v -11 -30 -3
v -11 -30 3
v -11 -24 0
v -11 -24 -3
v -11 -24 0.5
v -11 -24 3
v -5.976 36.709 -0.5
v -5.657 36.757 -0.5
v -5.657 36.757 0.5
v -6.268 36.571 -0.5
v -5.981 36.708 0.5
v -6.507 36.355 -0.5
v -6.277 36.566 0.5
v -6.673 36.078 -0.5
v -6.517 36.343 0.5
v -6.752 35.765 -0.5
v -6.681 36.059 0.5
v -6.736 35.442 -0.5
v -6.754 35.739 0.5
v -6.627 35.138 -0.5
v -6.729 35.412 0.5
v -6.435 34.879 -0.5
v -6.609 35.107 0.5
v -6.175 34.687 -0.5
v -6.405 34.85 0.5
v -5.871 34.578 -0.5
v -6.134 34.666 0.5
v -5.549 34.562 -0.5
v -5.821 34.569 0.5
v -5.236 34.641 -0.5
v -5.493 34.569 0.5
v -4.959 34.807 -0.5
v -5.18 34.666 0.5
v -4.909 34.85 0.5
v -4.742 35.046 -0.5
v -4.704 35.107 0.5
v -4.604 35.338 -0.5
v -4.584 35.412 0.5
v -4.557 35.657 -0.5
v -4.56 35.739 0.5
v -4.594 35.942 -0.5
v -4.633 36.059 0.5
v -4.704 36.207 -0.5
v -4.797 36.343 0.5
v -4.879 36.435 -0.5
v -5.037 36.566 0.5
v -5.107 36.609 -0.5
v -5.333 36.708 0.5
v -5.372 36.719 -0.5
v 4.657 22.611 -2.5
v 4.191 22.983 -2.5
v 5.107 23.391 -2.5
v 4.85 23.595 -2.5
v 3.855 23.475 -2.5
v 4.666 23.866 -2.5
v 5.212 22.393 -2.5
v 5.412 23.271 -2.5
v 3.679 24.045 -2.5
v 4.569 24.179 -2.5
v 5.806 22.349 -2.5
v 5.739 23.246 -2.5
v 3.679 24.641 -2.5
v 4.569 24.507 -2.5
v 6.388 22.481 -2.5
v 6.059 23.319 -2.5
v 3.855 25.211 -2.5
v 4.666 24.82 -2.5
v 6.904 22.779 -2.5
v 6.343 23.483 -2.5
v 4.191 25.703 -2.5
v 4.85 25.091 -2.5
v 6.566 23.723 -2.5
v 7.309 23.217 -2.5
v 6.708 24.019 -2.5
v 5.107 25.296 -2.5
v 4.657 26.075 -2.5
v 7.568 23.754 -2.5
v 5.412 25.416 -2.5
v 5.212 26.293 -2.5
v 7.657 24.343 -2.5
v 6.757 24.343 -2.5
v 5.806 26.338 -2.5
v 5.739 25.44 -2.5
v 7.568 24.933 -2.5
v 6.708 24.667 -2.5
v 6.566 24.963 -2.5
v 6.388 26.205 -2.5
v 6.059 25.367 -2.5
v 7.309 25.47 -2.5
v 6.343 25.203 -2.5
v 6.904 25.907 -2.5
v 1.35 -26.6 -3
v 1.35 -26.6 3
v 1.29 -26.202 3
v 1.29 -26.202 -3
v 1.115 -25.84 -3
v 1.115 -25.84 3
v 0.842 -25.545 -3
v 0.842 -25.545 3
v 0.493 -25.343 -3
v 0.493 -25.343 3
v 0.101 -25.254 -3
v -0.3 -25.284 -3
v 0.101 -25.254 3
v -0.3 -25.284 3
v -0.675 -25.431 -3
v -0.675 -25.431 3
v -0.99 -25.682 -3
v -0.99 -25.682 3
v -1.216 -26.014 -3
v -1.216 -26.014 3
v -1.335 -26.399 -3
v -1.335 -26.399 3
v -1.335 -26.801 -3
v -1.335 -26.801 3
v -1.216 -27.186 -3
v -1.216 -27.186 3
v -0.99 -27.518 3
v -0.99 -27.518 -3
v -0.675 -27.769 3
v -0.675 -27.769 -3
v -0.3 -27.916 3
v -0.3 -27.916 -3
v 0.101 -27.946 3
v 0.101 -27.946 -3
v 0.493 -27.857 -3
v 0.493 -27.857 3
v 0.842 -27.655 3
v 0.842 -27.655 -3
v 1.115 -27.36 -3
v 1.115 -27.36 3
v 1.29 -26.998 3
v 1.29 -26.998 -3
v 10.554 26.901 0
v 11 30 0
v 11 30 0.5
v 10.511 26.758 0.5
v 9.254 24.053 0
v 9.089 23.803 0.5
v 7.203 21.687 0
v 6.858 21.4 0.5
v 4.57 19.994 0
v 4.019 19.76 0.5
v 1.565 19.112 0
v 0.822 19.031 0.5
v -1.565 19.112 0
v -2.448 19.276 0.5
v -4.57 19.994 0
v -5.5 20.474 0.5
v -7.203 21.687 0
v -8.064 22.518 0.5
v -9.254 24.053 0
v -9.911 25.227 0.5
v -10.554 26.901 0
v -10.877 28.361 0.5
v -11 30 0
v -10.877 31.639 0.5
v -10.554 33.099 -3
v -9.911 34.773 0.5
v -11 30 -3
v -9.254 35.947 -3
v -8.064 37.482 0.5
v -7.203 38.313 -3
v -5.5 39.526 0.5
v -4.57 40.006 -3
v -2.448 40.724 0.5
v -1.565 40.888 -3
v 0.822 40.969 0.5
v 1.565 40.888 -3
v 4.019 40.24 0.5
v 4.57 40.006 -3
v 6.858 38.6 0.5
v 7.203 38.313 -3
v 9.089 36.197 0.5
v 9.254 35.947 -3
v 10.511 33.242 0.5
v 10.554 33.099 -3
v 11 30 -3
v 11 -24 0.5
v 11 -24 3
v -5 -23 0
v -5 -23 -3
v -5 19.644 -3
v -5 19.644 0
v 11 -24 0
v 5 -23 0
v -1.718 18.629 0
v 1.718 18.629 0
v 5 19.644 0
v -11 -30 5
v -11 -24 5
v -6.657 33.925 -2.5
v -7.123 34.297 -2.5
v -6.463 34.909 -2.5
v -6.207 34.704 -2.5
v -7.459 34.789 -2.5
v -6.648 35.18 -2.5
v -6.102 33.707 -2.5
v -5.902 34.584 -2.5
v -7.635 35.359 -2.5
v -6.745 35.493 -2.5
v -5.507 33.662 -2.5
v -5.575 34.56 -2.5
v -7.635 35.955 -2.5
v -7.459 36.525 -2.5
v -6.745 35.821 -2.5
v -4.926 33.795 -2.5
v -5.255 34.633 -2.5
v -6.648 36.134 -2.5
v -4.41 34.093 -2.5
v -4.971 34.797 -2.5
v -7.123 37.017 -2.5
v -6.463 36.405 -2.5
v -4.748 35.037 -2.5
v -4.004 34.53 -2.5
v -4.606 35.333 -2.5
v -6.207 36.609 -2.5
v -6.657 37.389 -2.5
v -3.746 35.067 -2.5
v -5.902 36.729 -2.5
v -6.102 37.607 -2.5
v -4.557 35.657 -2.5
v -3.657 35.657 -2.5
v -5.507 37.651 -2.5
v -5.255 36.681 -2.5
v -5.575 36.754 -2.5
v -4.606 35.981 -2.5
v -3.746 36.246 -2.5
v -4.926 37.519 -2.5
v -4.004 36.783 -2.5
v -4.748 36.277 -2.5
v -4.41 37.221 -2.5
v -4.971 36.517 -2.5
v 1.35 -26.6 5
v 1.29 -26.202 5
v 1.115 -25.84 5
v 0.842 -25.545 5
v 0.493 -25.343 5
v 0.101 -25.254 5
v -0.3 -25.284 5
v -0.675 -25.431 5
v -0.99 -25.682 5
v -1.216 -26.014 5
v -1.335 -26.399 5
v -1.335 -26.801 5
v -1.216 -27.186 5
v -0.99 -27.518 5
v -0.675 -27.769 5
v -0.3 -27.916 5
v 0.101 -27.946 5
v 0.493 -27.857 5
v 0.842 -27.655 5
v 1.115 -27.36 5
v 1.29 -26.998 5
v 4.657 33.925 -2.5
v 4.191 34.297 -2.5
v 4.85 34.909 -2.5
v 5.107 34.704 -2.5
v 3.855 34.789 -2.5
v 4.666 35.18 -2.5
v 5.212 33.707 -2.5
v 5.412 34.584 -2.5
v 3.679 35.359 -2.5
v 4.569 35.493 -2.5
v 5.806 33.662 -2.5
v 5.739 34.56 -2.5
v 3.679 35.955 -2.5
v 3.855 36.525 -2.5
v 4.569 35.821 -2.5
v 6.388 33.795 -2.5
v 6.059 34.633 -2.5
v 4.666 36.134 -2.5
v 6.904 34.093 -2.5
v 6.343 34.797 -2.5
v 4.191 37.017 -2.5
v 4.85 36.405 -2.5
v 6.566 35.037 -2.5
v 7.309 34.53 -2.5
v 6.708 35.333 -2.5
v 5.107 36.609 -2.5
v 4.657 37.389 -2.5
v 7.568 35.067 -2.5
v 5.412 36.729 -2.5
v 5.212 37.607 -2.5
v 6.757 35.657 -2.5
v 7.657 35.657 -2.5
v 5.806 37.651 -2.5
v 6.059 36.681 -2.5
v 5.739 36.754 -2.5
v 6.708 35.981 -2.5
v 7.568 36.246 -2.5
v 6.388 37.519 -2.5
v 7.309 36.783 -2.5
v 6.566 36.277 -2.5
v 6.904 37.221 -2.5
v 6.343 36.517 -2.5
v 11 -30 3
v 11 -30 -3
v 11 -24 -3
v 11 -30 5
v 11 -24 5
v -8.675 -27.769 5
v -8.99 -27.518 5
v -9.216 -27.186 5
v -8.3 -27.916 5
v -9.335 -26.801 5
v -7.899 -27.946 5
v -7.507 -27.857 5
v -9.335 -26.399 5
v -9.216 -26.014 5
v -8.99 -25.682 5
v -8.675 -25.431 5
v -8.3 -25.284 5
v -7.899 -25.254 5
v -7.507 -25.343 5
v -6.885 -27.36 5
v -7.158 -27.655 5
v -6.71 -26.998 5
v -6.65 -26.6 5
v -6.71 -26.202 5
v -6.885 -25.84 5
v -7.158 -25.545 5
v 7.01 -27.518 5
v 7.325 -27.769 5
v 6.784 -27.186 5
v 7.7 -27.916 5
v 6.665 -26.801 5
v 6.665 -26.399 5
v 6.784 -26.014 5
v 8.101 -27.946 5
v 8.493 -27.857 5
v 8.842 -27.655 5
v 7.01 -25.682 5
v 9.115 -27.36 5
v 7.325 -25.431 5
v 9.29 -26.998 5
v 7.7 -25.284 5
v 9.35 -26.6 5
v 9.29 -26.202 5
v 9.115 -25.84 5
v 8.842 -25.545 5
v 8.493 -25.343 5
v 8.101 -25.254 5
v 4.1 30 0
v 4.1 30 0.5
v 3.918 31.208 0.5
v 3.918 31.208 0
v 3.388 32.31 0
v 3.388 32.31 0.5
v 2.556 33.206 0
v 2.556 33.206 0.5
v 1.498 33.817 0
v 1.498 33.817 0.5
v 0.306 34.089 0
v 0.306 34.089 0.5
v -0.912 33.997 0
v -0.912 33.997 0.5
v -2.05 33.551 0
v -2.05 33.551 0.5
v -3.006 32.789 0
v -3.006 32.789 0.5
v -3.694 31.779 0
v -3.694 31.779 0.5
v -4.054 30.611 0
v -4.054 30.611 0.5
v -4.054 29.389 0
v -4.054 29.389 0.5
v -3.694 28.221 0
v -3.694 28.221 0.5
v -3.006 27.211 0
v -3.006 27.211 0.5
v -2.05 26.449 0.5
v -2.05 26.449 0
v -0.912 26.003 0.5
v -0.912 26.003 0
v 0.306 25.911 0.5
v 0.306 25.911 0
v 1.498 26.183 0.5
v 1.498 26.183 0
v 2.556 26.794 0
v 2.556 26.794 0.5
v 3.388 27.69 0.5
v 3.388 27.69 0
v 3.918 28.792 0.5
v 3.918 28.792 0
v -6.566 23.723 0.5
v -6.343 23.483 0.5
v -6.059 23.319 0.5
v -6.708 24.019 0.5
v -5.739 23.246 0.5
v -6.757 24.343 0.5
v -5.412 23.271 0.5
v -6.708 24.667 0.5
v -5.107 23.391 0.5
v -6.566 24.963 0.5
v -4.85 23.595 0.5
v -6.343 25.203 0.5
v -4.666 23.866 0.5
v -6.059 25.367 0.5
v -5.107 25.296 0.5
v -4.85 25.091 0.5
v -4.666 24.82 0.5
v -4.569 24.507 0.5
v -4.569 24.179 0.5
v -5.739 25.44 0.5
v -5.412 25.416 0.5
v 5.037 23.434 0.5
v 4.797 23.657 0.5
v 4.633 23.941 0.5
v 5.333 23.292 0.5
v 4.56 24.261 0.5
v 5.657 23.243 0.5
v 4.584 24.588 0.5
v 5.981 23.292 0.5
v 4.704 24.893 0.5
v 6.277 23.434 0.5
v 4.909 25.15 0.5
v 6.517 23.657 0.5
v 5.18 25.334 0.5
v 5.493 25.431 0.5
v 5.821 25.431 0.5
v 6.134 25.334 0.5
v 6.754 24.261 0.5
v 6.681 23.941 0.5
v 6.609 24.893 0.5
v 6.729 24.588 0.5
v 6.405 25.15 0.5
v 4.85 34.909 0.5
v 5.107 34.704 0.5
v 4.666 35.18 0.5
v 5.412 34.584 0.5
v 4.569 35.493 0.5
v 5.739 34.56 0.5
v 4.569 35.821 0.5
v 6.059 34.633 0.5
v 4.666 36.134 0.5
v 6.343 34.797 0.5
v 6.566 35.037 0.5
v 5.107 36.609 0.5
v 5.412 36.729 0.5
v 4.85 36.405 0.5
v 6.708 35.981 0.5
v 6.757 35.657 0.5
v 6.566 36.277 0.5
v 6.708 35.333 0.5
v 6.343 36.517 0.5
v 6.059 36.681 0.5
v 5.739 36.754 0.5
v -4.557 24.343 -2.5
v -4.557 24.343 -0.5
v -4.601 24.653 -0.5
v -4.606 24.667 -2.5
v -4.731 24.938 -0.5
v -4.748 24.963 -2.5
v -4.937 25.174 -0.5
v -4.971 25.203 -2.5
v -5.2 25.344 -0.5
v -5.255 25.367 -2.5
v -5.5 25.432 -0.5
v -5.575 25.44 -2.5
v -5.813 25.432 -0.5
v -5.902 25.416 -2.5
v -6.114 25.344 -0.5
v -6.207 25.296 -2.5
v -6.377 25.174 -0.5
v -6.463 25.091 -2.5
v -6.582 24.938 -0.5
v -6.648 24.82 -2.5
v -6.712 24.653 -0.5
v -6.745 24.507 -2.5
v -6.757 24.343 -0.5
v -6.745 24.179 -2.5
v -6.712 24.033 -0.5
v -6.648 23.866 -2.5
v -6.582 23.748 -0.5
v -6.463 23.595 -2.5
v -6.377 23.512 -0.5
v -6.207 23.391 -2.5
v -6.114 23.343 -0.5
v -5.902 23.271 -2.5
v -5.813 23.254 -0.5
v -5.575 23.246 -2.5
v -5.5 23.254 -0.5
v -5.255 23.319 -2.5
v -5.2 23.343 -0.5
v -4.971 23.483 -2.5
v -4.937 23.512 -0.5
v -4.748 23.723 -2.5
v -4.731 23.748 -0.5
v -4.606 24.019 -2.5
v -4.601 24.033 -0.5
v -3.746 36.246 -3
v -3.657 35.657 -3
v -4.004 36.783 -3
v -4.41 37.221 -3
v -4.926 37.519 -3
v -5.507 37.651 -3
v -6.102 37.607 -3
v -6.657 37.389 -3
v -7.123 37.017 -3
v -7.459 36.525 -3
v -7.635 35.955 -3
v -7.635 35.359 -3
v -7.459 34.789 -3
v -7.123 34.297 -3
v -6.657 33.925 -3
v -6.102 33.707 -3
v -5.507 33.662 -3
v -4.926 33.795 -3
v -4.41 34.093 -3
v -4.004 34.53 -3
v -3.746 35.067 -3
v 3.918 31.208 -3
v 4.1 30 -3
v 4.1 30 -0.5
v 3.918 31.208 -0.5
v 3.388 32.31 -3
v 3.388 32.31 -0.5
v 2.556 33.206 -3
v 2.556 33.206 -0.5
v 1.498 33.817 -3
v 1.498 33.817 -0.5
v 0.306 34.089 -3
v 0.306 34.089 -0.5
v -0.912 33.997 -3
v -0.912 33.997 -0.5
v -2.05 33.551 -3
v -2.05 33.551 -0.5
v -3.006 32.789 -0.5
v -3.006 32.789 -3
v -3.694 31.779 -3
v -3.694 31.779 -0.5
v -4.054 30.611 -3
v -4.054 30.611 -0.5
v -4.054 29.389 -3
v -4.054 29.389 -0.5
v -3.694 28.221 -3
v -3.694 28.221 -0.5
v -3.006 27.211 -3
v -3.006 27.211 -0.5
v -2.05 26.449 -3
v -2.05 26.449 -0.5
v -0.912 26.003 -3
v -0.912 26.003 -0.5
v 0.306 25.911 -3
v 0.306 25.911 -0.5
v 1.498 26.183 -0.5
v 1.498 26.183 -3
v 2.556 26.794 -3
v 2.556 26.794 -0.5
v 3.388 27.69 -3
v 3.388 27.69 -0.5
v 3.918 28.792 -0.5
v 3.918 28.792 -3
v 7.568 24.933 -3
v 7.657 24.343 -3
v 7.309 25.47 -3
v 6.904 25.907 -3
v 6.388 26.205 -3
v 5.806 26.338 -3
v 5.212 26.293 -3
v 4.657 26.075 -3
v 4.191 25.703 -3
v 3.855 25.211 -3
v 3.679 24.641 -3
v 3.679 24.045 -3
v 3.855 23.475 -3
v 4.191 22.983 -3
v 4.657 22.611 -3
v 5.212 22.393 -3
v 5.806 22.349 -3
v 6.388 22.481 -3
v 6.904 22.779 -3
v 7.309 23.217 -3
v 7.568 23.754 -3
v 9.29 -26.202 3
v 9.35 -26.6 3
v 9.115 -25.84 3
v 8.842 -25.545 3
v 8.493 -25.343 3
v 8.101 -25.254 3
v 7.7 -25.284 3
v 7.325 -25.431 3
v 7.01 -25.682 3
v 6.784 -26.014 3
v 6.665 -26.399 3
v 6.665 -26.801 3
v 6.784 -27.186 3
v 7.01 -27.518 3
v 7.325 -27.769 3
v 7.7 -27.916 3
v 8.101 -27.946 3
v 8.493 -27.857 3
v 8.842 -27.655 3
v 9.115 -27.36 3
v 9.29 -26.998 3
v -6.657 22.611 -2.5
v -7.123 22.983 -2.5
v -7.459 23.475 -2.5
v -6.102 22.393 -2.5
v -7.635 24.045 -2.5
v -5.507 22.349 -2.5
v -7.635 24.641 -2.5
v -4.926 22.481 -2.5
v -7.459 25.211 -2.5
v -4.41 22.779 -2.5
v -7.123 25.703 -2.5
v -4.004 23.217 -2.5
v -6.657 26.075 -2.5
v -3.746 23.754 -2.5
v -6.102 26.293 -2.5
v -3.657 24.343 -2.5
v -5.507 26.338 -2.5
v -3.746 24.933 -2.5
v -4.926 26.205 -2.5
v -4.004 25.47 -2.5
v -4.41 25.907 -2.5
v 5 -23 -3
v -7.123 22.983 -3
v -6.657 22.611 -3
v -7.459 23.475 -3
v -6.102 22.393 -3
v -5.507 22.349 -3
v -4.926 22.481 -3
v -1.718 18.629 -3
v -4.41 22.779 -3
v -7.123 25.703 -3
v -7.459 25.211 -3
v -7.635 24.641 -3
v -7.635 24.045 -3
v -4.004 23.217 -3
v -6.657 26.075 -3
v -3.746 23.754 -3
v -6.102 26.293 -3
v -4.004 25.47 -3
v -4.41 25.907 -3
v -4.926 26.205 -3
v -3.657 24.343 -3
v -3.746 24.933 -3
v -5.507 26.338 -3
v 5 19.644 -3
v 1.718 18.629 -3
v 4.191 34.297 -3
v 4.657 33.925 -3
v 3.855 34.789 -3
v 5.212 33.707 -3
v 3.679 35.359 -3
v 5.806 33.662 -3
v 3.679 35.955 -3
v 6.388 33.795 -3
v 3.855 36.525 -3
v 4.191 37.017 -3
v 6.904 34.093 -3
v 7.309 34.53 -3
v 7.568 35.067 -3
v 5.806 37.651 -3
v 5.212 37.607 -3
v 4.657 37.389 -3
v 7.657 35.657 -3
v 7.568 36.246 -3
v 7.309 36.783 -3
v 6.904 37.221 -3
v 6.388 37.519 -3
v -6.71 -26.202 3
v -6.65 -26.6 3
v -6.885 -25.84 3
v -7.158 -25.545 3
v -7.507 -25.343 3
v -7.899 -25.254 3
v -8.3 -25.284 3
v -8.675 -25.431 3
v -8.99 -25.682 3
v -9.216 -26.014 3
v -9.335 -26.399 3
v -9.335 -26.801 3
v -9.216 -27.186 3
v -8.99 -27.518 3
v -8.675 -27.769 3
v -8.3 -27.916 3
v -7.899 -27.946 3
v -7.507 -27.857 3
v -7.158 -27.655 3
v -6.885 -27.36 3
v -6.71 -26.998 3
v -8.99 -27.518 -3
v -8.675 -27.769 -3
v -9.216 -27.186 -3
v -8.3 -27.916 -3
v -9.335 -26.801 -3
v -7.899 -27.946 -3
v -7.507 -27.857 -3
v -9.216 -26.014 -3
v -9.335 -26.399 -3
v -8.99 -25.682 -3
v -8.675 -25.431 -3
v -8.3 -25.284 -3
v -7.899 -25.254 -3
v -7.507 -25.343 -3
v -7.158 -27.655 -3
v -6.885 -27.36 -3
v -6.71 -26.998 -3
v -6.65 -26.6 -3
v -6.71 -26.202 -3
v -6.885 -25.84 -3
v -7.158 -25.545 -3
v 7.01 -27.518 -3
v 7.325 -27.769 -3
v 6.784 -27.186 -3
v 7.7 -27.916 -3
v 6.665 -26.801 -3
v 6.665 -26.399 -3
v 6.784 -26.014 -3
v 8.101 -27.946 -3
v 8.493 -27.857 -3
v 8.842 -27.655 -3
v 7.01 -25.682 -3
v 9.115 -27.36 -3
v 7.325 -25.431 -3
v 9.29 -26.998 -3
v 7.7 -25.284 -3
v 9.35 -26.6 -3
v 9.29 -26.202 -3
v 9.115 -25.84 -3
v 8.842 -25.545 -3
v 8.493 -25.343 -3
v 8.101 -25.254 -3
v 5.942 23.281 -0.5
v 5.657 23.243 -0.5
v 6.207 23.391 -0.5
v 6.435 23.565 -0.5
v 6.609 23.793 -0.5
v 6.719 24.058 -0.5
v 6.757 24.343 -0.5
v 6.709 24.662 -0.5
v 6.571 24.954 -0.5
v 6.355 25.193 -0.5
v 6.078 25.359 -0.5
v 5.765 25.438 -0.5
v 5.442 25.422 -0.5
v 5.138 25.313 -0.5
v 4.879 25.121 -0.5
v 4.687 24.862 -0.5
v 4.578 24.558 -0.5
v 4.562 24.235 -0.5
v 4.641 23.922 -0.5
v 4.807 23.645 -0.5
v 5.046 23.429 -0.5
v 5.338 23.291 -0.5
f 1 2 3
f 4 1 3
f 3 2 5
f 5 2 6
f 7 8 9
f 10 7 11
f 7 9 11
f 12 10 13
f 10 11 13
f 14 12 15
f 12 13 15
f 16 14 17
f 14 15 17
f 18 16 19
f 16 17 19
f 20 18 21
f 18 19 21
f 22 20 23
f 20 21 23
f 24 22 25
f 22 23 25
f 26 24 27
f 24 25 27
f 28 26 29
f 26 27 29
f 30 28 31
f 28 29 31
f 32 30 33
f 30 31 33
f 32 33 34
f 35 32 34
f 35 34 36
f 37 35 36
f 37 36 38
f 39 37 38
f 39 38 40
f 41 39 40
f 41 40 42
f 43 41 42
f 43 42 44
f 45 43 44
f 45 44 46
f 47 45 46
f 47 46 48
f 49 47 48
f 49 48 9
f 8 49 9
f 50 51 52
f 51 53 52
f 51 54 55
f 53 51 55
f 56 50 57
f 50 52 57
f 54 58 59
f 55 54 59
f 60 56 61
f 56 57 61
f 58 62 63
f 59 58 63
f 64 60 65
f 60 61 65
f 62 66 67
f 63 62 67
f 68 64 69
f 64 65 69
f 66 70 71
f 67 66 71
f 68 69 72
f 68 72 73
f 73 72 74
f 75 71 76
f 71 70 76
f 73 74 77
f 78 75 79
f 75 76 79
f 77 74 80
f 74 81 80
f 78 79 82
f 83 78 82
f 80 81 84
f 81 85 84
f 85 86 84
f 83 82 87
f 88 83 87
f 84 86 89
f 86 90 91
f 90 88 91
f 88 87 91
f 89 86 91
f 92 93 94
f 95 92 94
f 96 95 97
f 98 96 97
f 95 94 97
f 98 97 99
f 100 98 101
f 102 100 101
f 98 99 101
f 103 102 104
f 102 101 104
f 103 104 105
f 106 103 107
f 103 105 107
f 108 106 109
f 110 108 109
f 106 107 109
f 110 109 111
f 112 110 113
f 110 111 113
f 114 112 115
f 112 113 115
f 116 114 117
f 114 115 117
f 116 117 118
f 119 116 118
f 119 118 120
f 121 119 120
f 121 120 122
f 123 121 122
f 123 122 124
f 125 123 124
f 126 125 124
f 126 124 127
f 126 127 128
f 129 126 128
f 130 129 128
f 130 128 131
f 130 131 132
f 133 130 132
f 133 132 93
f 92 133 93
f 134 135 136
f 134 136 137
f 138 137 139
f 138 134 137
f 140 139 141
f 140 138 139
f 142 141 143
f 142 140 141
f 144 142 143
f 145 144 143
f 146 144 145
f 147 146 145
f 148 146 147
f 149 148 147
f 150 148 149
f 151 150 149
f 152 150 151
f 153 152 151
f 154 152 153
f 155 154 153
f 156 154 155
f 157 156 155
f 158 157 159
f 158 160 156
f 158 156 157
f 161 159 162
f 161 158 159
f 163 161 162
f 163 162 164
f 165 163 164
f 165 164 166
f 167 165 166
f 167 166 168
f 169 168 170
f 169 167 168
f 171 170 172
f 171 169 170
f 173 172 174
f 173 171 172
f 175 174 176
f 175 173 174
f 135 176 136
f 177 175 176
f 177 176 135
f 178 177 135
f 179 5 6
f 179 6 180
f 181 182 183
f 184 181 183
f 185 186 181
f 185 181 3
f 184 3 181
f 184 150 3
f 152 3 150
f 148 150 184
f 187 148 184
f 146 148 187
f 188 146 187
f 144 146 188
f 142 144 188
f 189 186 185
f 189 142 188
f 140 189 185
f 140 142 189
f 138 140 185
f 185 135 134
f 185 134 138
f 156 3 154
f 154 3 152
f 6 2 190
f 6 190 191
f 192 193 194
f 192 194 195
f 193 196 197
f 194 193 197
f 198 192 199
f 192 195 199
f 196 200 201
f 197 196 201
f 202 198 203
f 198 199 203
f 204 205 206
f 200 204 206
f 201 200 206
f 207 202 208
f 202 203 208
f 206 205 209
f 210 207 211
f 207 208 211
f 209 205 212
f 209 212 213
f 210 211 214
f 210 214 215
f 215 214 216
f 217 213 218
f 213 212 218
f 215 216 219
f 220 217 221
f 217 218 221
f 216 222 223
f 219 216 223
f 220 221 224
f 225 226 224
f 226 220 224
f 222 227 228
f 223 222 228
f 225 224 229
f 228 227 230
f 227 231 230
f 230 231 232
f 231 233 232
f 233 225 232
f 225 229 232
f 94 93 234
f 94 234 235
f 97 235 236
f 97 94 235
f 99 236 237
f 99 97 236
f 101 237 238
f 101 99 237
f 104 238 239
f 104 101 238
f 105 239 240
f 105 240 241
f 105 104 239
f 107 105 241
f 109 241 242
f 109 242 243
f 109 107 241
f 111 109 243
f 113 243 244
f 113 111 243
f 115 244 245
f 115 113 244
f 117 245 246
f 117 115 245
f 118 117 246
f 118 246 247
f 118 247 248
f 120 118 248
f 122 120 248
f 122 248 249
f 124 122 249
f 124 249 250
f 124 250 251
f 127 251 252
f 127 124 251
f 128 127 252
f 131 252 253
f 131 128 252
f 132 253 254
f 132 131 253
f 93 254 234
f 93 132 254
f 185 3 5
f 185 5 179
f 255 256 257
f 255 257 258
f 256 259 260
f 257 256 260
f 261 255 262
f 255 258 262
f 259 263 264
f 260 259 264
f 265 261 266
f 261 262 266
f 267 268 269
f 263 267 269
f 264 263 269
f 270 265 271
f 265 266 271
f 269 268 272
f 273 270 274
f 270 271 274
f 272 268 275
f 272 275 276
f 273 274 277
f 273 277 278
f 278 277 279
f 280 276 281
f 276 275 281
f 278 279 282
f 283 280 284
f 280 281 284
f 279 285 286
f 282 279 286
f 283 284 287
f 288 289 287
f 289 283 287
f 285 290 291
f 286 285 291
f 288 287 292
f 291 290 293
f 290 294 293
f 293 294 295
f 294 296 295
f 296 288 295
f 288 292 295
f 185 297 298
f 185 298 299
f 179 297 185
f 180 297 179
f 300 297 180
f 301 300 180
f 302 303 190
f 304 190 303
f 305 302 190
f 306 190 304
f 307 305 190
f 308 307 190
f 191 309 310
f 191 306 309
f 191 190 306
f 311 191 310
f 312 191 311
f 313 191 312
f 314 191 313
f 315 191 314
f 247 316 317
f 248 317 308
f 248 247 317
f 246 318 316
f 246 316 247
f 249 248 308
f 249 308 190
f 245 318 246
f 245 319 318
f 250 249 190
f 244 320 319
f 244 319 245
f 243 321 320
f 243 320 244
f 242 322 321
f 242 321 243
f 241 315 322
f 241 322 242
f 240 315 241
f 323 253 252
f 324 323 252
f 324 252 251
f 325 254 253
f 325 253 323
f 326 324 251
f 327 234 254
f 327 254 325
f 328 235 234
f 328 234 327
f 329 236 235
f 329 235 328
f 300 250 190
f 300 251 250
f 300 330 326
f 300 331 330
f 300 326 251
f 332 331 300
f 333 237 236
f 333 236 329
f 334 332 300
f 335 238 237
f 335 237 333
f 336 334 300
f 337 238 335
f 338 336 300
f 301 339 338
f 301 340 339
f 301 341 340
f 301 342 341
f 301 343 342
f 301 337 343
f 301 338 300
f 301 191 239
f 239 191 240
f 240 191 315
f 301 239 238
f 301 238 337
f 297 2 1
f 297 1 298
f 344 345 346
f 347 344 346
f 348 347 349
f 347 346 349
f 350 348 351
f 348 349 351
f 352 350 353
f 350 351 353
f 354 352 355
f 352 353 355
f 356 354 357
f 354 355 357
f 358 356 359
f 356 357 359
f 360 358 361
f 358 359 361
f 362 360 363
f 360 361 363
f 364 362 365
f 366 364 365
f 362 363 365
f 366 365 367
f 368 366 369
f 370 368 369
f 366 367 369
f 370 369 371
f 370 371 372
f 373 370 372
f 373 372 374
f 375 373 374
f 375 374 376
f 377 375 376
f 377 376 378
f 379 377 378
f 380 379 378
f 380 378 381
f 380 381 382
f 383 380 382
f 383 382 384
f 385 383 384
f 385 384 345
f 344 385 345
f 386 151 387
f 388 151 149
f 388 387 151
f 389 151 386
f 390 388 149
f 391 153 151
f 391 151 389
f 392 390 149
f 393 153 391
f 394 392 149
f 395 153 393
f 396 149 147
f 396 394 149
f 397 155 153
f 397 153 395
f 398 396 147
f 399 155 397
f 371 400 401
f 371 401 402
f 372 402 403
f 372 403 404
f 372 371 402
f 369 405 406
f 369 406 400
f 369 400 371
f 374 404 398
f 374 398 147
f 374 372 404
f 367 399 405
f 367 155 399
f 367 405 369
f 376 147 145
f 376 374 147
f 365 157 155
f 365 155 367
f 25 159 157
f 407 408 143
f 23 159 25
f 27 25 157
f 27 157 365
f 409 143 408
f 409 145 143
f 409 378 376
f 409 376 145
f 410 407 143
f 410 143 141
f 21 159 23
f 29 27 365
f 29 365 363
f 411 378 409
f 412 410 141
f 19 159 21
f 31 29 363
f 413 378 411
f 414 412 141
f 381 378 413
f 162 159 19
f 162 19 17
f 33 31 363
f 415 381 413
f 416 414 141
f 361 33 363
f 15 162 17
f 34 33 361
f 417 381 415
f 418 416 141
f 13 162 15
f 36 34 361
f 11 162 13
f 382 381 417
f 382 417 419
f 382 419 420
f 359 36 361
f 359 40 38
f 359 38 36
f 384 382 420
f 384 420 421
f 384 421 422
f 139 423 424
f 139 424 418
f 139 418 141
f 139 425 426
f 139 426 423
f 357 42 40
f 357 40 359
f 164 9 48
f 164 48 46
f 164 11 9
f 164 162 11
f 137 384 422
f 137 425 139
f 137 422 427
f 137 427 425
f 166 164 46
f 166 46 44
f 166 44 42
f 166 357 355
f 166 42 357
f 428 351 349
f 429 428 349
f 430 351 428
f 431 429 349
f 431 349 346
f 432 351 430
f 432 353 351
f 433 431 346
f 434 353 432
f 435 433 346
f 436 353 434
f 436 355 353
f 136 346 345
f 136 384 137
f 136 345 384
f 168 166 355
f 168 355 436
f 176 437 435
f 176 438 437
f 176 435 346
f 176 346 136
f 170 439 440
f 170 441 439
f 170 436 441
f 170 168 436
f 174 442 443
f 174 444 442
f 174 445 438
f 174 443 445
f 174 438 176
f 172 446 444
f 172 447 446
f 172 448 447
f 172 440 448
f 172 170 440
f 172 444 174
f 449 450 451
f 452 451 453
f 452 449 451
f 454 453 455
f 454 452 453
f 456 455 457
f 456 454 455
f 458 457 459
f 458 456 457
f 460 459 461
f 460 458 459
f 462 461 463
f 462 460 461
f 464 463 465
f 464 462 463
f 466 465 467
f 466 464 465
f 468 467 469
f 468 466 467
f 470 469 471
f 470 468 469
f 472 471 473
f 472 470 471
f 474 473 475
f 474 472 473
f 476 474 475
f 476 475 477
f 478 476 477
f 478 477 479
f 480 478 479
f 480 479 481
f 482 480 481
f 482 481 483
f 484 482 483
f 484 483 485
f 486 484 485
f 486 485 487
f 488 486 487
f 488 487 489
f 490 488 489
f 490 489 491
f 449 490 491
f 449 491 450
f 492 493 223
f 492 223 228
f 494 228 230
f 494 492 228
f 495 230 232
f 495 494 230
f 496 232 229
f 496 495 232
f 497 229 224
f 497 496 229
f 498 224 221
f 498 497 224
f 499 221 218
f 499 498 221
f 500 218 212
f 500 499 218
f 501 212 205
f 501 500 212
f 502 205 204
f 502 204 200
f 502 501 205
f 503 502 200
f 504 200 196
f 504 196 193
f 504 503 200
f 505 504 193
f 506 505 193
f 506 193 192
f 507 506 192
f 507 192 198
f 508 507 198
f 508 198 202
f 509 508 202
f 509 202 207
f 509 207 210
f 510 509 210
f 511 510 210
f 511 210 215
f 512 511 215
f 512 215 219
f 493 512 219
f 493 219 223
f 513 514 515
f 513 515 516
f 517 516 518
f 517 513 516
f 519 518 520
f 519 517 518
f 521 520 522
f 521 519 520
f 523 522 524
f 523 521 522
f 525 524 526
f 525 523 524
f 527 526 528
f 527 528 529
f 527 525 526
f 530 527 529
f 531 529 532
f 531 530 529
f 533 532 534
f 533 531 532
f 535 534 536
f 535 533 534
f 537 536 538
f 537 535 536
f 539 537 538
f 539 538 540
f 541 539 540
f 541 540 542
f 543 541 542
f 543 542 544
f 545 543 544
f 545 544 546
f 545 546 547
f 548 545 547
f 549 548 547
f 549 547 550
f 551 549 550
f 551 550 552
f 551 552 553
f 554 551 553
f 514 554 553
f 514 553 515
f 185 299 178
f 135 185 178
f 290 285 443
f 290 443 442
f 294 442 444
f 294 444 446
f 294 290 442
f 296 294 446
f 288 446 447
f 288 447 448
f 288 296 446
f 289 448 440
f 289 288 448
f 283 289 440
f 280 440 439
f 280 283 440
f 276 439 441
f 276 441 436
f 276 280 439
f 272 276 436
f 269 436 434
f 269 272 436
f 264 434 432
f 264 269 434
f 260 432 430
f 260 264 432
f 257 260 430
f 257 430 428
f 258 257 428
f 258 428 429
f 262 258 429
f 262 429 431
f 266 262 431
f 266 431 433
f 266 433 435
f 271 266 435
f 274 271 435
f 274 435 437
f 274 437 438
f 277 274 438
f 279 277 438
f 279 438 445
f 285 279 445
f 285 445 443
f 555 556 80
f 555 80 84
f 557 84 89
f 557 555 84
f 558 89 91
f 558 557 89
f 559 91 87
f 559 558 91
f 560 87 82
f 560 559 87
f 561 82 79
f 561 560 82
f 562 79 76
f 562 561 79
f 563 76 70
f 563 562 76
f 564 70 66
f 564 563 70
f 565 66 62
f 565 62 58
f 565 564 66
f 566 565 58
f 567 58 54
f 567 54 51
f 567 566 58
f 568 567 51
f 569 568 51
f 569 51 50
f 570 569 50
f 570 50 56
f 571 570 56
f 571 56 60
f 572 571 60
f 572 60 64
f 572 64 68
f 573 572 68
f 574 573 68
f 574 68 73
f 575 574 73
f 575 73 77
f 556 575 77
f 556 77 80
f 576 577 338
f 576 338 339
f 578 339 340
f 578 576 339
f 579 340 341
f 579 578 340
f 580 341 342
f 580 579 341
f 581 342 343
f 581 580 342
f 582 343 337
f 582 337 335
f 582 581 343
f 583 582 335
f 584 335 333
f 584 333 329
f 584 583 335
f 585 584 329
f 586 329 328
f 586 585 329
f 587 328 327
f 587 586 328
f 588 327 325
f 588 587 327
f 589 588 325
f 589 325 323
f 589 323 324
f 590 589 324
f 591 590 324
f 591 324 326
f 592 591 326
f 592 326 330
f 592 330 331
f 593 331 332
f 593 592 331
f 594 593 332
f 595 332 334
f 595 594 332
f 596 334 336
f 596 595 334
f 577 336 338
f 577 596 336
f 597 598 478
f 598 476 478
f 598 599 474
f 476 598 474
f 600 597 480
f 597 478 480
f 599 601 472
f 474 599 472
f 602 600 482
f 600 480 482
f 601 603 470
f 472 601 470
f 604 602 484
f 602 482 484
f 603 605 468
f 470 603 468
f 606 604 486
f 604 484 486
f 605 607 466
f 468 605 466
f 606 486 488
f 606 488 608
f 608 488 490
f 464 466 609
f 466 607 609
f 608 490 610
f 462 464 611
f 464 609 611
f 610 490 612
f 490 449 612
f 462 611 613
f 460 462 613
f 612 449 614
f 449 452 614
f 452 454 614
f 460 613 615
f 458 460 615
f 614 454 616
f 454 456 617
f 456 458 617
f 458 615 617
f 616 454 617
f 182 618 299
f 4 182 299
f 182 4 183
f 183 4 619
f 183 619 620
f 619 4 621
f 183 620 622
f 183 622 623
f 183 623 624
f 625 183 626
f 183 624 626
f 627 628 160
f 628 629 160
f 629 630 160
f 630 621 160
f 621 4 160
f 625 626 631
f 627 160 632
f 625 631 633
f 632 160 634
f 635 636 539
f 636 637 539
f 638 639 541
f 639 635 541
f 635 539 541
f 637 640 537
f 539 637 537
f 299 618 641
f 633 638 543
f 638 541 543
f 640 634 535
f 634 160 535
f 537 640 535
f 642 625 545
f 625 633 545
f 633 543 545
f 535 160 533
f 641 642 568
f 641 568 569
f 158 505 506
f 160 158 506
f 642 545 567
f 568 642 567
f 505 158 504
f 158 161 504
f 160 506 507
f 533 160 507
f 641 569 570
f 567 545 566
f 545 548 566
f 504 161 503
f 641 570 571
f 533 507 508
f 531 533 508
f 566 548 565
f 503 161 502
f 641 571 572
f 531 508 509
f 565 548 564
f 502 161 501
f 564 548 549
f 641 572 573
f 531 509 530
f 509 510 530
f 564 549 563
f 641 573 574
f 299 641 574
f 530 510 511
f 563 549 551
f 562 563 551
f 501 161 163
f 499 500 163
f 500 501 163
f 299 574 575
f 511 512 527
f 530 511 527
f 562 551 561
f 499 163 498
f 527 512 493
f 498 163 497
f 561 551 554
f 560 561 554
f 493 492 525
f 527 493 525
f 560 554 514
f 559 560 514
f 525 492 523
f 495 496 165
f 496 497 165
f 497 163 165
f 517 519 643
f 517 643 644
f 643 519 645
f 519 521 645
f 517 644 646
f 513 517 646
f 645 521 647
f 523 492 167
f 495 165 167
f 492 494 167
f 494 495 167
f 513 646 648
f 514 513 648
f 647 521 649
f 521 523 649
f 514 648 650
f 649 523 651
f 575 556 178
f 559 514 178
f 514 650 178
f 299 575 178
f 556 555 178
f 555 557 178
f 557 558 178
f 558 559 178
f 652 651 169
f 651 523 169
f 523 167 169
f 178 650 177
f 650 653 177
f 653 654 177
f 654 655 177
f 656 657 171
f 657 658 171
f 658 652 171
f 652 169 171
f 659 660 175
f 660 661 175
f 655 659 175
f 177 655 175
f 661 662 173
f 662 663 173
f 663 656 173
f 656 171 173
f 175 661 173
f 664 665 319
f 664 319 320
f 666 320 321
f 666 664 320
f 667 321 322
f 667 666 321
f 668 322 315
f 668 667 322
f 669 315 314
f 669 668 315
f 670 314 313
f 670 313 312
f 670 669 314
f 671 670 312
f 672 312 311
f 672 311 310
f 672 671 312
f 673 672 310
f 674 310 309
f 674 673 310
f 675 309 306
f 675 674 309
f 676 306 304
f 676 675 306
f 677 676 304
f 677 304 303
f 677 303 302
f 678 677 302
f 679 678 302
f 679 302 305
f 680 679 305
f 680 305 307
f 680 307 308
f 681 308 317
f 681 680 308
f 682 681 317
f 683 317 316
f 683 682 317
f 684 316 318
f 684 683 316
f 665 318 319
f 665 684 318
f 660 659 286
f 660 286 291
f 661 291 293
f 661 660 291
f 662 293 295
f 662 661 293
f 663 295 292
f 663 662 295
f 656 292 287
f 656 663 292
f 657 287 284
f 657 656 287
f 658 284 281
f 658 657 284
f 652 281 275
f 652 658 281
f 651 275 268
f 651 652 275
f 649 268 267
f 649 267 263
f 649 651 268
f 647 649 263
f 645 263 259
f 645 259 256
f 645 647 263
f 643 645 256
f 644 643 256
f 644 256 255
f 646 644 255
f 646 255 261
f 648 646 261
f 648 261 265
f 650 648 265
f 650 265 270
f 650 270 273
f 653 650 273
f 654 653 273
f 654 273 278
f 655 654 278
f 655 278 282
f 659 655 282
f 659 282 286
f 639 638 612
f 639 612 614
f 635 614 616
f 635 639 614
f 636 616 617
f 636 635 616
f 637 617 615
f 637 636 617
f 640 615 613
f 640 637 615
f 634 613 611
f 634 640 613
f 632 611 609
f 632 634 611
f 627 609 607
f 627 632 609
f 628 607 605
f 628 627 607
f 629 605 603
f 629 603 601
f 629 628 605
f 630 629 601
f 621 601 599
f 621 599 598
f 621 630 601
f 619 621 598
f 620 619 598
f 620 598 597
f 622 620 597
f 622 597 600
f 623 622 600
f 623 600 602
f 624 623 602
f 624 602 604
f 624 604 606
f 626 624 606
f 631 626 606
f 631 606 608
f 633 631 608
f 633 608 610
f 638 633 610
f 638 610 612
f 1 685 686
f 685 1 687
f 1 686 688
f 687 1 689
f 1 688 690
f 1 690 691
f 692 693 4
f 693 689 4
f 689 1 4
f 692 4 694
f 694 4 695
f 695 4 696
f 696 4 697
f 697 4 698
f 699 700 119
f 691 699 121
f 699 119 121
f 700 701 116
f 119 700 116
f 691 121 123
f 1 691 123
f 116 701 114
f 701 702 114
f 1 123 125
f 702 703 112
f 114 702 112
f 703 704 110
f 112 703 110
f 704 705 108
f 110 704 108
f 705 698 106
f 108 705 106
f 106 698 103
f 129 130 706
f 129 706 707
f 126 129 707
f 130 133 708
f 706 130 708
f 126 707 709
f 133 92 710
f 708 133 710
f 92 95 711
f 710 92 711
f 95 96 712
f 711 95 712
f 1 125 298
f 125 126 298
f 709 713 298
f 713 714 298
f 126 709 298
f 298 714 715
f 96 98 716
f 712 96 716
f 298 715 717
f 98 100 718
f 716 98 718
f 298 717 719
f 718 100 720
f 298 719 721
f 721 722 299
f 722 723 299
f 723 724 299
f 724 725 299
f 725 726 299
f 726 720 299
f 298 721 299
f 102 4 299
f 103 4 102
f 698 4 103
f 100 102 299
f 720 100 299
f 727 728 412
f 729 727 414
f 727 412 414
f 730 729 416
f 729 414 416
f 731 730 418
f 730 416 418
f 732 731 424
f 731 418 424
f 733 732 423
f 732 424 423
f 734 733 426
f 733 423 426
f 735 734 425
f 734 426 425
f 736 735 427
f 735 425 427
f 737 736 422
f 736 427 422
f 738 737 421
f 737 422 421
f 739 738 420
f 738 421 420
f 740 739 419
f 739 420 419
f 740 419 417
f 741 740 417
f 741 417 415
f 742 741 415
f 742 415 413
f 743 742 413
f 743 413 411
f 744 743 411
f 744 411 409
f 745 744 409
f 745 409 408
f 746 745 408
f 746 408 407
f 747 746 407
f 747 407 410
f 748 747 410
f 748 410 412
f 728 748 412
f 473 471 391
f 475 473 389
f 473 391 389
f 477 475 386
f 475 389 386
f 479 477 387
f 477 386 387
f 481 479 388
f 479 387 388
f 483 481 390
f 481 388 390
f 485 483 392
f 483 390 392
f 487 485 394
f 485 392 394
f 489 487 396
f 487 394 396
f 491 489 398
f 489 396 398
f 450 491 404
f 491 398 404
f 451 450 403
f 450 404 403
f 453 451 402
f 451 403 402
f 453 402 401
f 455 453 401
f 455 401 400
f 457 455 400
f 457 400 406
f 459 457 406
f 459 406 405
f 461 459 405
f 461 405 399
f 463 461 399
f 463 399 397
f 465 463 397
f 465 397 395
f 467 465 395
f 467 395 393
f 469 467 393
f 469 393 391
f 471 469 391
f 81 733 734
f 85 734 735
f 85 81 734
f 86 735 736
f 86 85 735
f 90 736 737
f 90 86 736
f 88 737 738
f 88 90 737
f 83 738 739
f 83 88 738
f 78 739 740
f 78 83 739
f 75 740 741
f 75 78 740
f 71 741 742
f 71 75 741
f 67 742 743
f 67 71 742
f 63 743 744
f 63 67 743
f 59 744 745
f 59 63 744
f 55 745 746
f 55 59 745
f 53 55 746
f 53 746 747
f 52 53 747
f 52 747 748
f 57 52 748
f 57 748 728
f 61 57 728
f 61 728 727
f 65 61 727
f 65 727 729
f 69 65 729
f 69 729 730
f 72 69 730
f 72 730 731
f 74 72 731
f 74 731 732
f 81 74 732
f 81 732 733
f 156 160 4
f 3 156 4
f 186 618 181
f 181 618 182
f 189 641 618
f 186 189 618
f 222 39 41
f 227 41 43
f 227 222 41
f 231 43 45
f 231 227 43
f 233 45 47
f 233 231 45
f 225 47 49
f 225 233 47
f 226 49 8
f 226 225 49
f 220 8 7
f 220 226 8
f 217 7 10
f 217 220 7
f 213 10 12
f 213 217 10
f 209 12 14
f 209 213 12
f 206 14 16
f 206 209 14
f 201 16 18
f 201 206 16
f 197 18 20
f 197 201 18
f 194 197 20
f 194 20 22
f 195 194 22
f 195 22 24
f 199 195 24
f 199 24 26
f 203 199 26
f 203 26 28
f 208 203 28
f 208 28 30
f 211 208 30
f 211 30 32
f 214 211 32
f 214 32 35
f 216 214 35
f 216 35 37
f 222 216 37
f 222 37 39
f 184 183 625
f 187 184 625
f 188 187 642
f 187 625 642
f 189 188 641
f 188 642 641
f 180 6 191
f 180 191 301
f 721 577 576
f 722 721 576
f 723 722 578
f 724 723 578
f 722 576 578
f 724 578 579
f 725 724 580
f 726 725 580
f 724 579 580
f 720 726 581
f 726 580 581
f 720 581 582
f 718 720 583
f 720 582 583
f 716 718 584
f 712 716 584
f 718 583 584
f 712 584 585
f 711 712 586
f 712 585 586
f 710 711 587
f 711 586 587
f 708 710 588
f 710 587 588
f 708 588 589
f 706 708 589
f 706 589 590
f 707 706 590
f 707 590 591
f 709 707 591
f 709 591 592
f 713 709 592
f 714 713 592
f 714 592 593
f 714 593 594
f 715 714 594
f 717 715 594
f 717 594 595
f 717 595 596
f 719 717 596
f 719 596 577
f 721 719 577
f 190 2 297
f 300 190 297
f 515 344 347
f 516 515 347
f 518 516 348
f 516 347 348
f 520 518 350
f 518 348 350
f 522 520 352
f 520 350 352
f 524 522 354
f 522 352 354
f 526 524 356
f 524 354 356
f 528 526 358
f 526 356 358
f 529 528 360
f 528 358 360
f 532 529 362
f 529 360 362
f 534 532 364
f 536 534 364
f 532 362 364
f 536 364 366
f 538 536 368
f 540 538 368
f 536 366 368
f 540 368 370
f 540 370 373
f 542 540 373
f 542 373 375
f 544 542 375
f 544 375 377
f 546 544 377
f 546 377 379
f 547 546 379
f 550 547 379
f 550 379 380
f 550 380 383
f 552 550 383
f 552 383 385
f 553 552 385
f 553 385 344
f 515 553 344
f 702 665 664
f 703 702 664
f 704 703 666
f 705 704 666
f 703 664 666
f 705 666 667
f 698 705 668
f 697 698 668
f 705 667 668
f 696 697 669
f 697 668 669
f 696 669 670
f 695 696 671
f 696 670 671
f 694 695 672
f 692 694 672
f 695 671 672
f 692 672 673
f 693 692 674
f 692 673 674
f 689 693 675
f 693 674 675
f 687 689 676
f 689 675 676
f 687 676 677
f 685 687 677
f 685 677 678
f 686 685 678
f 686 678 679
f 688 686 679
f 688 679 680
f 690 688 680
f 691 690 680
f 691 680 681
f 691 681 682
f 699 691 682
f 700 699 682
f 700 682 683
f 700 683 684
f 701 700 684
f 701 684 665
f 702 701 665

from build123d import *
from build123d.topology import SkipClean

# Parameters (mm, degrees)
BOSS_EXTRUDE1_DEPTH           = 3
BOSS_EXTRUDE2_START           = -0.5
SKETCH1_3_R                   = 11
BOSS_EXTRUDE2_DEPTH           = 0.5
SKETCH2_R                     = 4.1
SKETCH2_R_2                   = 1.1
CUT_EXTRUDE1_DEPTH            = 3.5
SKETCH2_3_R                   = 2
CUT_EXTRUDE2_DEPTH            = 0.5
CIRPATTERN2_COUNT             = 4
SKETCH1_6_W                   = 11
SKETCH1_6_H                   = 6
BOSS_EXTRUDE3_DEPTH           = 5
SKETCH4_R                     = 1.35
CUT_EXTRUDE4_DEPTH            = 8
LPATTERN2_COUNT               = 2
LPATTERN2_PITCH               = 8
LPATTERN2_COL_COUNT           = 2
LPATTERN2_COL_PITCH           = 8
BODY_MOVE_COPY1_START         = -3
BODY_MOVE_COPY1_OUTLINE_R     = 2
BODY_MOVE_COPY1_OUTLINE_R_2   = 4.1
BODY_MOVE_COPY1_DEPTH         = 3
BODY_MOVE_COPY1_START_2       = 3
BODY_MOVE_COPY1_2_OUTLINE_W   = 22
BODY_MOVE_COPY1_2_OUTLINE_H   = 6
BODY_MOVE_COPY1_2_OUTLINE_R   = 1.35
BODY_MOVE_COPY1_2_DEPTH       = 2
BODY_MOVE_COPY1_START_3       = -2.5
BODY_MOVE_COPY1_3_OUTLINE_R   = 2
BODY_MOVE_COPY1_3_OUTLINE_R_2 = 1.1
BODY_MOVE_COPY1_3_DEPTH       = 2
BODY_MOVE_COPY1_START_4       = 0.5
BODY_MOVE_COPY1_4_OUTLINE_R   = 1.1
BODY_MOVE_COPY1_4_OUTLINE_R_2 = 4.1
BODY_MOVE_COPY1_4_DEPTH       = 2.5
BODY_MOVE_COPY1_5_DEPTH       = 0.5
BODY_MOVE_COPY1_START_5       = -5
BODY_MOVE_COPY1_6_OUTLINE_W   = 22
BODY_MOVE_COPY1_6_OUTLINE_H   = 6
BODY_MOVE_COPY1_6_OUTLINE_R   = 1.35
BODY_MOVE_COPY1_6_DEPTH       = 2


# Read off the part's stored shape, not the designer's step: Body-Move/Copy1
with BuildPart() as part:
    # Sketch1 → Boss-Extrude1 (new body)
    with BuildSketch(Plane.XY):
        with BuildLine():
            Line((-11, 30), (-11, -30))
            Line((-11, -30), (11, -30))
            Line((11, -30), (11, 30))
            ThreePointArc((11, 30), (0, 41), (-11, 30))
        make_face()
        with BuildLine():
            Line((5, -23), (-5, -23))
            Line((-5, -23), (-5, 19.643842411))
            ThreePointArc((-5, 19.643842411), (0, 18.5), (5, 19.643842411))
            Line((5, 19.643842411), (5, -23))
        make_face(mode=Mode.SUBTRACT)
    extrude(amount=BOSS_EXTRUDE1_DEPTH)

    # Sketch1<3> → Boss-Extrude2 (add)
    with BuildSketch(Plane.XY.offset(BOSS_EXTRUDE2_START)):
        with Locations((0, 30)):
            Circle(SKETCH1_3_R)
    extrude(amount=BOSS_EXTRUDE2_DEPTH)

    # Sketch2 → Cut-Extrude1 (cut)
    with BuildSketch(Plane.XY.offset(3)):
        with Locations((0, 30)):
            Circle(SKETCH2_R)
        with Locations((5.656854249, 35.656854249)):
            Circle(SKETCH2_R_2)
    cut_extrude1 = extrude(amount=-CUT_EXTRUDE1_DEPTH, mode=Mode.SUBTRACT)

    # Sketch2<3> → Cut-Extrude2 (cut)
    with BuildSketch(Plane.XY.offset(3)):
        with Locations((5.656854249, 35.656854249)):
            Circle(SKETCH2_3_R)
    cut_extrude2 = extrude(amount=-CUT_EXTRUDE2_DEPTH, mode=Mode.SUBTRACT)

    # CirPattern2: Cut-Extrude1, Cut-Extrude2 ×4 about axis
    cirpattern2_axis = Axis((0, 30, 0), (0, 0, 1))
    add([cut_extrude1.rotate(cirpattern2_axis, i * 360 / CIRPATTERN2_COUNT) for i in range(1, CIRPATTERN2_COUNT)], mode=Mode.SUBTRACT)
    add([cut_extrude2.rotate(cirpattern2_axis, i * 360 / CIRPATTERN2_COUNT) for i in range(1, CIRPATTERN2_COUNT)], mode=Mode.SUBTRACT)

    # Sketch1<6> → Boss-Extrude3 (add)
    with BuildSketch(Plane.XY):
        with Locations((-5.5, -27)):
            Rectangle(SKETCH1_6_W, SKETCH1_6_H)
        with Locations((5.5, -27)):
            Rectangle(SKETCH1_6_W, SKETCH1_6_H)
    extrude(amount=-BOSS_EXTRUDE3_DEPTH)

    # Sketch4 → Cut-Extrude4 (cut)
    with BuildSketch(Plane.XY.offset(3)):
        with Locations((0, -26.6)):
            Circle(SKETCH4_R)
    cut_extrude4 = extrude(amount=-CUT_EXTRUDE4_DEPTH, mode=Mode.SUBTRACT)

    # LPattern2: Cut-Extrude4 ×2
    with Locations(*[(i * LPATTERN2_PITCH, 0, 0) for i in range(1, LPATTERN2_COUNT)]):
        add(cut_extrude4, mode=Mode.SUBTRACT)

    # LPattern2 col: Cut-Extrude4 ×2
    with Locations(*[(-i * LPATTERN2_COL_PITCH, 0, 0) for i in range(1, LPATTERN2_COL_COUNT)]):
        add(cut_extrude4, mode=Mode.SUBTRACT)

    # Body-Move/Copy1 outline → Body-Move/Copy1 (add)
    with BuildSketch(Plane.XY.offset(BODY_MOVE_COPY1_START)):
        with BuildLine():
            Line((-11, -24), (11, -24))
            Line((11, -24), (11, 30))
            ThreePointArc((11, 30), (0, 41), (-11, 30))
            Line((-11, 30), (-11, -24))
        make_face()
        with BuildLine():
            Line((5, 19.643842411), (5, -23))
            Line((5, -23), (-5, -23))
            Line((-5, -23), (-5, 19.643842411))
            ThreePointArc((-5, 19.643842411), (0, 18.5), (5, 19.643842411))
        make_face(mode=Mode.SUBTRACT)
        with Locations((5.656854249, 35.656854249)):
            Circle(BODY_MOVE_COPY1_OUTLINE_R, mode=Mode.SUBTRACT)
        with Locations((-5.656854249, 24.343145751)):
            Circle(BODY_MOVE_COPY1_OUTLINE_R, mode=Mode.SUBTRACT)
        with Locations((-5.656854249, 35.656854249)):
            Circle(BODY_MOVE_COPY1_OUTLINE_R, mode=Mode.SUBTRACT)
        with Locations((0, 30)):
            Circle(BODY_MOVE_COPY1_OUTLINE_R_2, mode=Mode.SUBTRACT)
        with Locations((5.656854249, 24.343145751)):
            Circle(BODY_MOVE_COPY1_OUTLINE_R, mode=Mode.SUBTRACT)
    extrude(amount=BODY_MOVE_COPY1_DEPTH)

    # Body-Move_Copy1 2 outline → Body-Move_Copy1 2 (add)
    with BuildSketch(Plane.XY.offset(BODY_MOVE_COPY1_START_2)):
        with Locations((0, -27)):
            Rectangle(BODY_MOVE_COPY1_2_OUTLINE_W, BODY_MOVE_COPY1_2_OUTLINE_H)
        with Locations((-8, -26.6)):
            Circle(BODY_MOVE_COPY1_2_OUTLINE_R, mode=Mode.SUBTRACT)
        with Locations((0, -26.6)):
            Circle(BODY_MOVE_COPY1_2_OUTLINE_R, mode=Mode.SUBTRACT)
        with Locations((8, -26.6)):
            Circle(BODY_MOVE_COPY1_2_OUTLINE_R, mode=Mode.SUBTRACT)
    extrude(amount=BODY_MOVE_COPY1_2_DEPTH)

    # Body-Move_Copy1 3 outline → Body-Move_Copy1 3 (add)
    # profile 1 of 4: a face of its own
    with BuildSketch(Plane.XY.offset(BODY_MOVE_COPY1_START_3)):
        with Locations((5.656854249, 35.656854249)):
            Circle(BODY_MOVE_COPY1_3_OUTLINE_R)
        with Locations((5.656854249, 35.656854249)):
            Circle(BODY_MOVE_COPY1_3_OUTLINE_R_2, mode=Mode.SUBTRACT)
    # profile 2 of 4: a face of its own
    with BuildSketch(Plane.XY.offset(BODY_MOVE_COPY1_START_3)):
        with Locations((5.656854249, 24.343145751)):
            Circle(BODY_MOVE_COPY1_3_OUTLINE_R)
        with Locations((5.656854249, 24.343145751)):
            Circle(BODY_MOVE_COPY1_3_OUTLINE_R_2, mode=Mode.SUBTRACT)
    # profile 3 of 4: a face of its own
    with BuildSketch(Plane.XY.offset(BODY_MOVE_COPY1_START_3)):
        with Locations((-5.656854249, 35.656854249)):
            Circle(BODY_MOVE_COPY1_3_OUTLINE_R)
        with Locations((-5.656854249, 35.656854249)):
            Circle(BODY_MOVE_COPY1_3_OUTLINE_R_2, mode=Mode.SUBTRACT)
    # profile 4 of 4: a face of its own
    with BuildSketch(Plane.XY.offset(BODY_MOVE_COPY1_START_3)):
        with Locations((-5.656854249, 24.343145751)):
            Circle(BODY_MOVE_COPY1_3_OUTLINE_R)
        with Locations((-5.656854249, 24.343145751)):
            Circle(BODY_MOVE_COPY1_3_OUTLINE_R_2, mode=Mode.SUBTRACT)
    extrude(amount=BODY_MOVE_COPY1_3_DEPTH)

    # Body-Move_Copy1 4 outline → Body-Move_Copy1 4 (cut)
    with BuildSketch(Plane.XY.offset(BODY_MOVE_COPY1_START_4)):
        with BuildLine():
            ThreePointArc((11, 30), (0, 41), (-11, 30))
            Line((-11, 30), (-11, -24))
            Line((-11, -24), (11, -24))
            Line((11, -24), (11, 30))
        make_face()
        with Locations((5.656854249, 35.656854249)):
            Circle(BODY_MOVE_COPY1_4_OUTLINE_R, mode=Mode.SUBTRACT)
        with Locations((0, 30)):
            Circle(BODY_MOVE_COPY1_4_OUTLINE_R_2, mode=Mode.SUBTRACT)
        with BuildLine():
            Line((5, -23), (-5, -23))
            Line((-5, -23), (-5, 19.643842411))
            ThreePointArc((-5, 19.643842411), (0, 18.5), (5, 19.643842411))
            Line((5, 19.643842411), (5, -23))
        make_face(mode=Mode.SUBTRACT)
        with Locations((-5.656854249, 24.343145751)):
            Circle(BODY_MOVE_COPY1_4_OUTLINE_R, mode=Mode.SUBTRACT)
        with Locations((-5.656854249, 35.656854249)):
            Circle(BODY_MOVE_COPY1_4_OUTLINE_R, mode=Mode.SUBTRACT)
        with Locations((5.656854249, 24.343145751)):
            Circle(BODY_MOVE_COPY1_4_OUTLINE_R, mode=Mode.SUBTRACT)
    extrude(amount=BODY_MOVE_COPY1_4_DEPTH, mode=Mode.SUBTRACT)

    # Body-Move_Copy1 5 outline → Body-Move_Copy1 5 (cut)
    with SkipClean():  # the faces are left unmerged after this step: merging them gives an invalid solid
        with BuildSketch(Plane.XY):
            with BuildLine():
                Line((-11, -24), (11, -24))
                Line((11, -24), (11, 30))
                ThreePointArc((11, 30), (0, 19), (-11, 30))
                Line((-11, 30), (-11, -24))
            make_face()
            with BuildLine():
                Line((5, 19.643842411), (5, -23))
                Line((5, -23), (-5, -23))
                Line((-5, -23), (-5, 19.643842411))
                ThreePointArc((-5, 19.643842411), (0, 18.5), (5, 19.643842411))
            make_face(mode=Mode.SUBTRACT)
        extrude(amount=BODY_MOVE_COPY1_5_DEPTH, mode=Mode.SUBTRACT)
    add(part.part.scale(1), mode=Mode.REPLACE)  # the faces are merged on a copy

    # Body-Move_Copy1 6 outline → Body-Move_Copy1 6 (cut)
    with BuildSketch(Plane.XY.offset(BODY_MOVE_COPY1_START_5)):
        with Locations((0, -27)):
            Rectangle(BODY_MOVE_COPY1_6_OUTLINE_W, BODY_MOVE_COPY1_6_OUTLINE_H)
        with Locations((-8, -26.6)):
            Circle(BODY_MOVE_COPY1_6_OUTLINE_R, mode=Mode.SUBTRACT)
        with Locations((0, -26.6)):
            Circle(BODY_MOVE_COPY1_6_OUTLINE_R, mode=Mode.SUBTRACT)
        with Locations((8, -26.6)):
            Circle(BODY_MOVE_COPY1_6_OUTLINE_R, mode=Mode.SUBTRACT)
    extrude(amount=BODY_MOVE_COPY1_6_DEPTH, mode=Mode.SUBTRACT)


solid = part.part
